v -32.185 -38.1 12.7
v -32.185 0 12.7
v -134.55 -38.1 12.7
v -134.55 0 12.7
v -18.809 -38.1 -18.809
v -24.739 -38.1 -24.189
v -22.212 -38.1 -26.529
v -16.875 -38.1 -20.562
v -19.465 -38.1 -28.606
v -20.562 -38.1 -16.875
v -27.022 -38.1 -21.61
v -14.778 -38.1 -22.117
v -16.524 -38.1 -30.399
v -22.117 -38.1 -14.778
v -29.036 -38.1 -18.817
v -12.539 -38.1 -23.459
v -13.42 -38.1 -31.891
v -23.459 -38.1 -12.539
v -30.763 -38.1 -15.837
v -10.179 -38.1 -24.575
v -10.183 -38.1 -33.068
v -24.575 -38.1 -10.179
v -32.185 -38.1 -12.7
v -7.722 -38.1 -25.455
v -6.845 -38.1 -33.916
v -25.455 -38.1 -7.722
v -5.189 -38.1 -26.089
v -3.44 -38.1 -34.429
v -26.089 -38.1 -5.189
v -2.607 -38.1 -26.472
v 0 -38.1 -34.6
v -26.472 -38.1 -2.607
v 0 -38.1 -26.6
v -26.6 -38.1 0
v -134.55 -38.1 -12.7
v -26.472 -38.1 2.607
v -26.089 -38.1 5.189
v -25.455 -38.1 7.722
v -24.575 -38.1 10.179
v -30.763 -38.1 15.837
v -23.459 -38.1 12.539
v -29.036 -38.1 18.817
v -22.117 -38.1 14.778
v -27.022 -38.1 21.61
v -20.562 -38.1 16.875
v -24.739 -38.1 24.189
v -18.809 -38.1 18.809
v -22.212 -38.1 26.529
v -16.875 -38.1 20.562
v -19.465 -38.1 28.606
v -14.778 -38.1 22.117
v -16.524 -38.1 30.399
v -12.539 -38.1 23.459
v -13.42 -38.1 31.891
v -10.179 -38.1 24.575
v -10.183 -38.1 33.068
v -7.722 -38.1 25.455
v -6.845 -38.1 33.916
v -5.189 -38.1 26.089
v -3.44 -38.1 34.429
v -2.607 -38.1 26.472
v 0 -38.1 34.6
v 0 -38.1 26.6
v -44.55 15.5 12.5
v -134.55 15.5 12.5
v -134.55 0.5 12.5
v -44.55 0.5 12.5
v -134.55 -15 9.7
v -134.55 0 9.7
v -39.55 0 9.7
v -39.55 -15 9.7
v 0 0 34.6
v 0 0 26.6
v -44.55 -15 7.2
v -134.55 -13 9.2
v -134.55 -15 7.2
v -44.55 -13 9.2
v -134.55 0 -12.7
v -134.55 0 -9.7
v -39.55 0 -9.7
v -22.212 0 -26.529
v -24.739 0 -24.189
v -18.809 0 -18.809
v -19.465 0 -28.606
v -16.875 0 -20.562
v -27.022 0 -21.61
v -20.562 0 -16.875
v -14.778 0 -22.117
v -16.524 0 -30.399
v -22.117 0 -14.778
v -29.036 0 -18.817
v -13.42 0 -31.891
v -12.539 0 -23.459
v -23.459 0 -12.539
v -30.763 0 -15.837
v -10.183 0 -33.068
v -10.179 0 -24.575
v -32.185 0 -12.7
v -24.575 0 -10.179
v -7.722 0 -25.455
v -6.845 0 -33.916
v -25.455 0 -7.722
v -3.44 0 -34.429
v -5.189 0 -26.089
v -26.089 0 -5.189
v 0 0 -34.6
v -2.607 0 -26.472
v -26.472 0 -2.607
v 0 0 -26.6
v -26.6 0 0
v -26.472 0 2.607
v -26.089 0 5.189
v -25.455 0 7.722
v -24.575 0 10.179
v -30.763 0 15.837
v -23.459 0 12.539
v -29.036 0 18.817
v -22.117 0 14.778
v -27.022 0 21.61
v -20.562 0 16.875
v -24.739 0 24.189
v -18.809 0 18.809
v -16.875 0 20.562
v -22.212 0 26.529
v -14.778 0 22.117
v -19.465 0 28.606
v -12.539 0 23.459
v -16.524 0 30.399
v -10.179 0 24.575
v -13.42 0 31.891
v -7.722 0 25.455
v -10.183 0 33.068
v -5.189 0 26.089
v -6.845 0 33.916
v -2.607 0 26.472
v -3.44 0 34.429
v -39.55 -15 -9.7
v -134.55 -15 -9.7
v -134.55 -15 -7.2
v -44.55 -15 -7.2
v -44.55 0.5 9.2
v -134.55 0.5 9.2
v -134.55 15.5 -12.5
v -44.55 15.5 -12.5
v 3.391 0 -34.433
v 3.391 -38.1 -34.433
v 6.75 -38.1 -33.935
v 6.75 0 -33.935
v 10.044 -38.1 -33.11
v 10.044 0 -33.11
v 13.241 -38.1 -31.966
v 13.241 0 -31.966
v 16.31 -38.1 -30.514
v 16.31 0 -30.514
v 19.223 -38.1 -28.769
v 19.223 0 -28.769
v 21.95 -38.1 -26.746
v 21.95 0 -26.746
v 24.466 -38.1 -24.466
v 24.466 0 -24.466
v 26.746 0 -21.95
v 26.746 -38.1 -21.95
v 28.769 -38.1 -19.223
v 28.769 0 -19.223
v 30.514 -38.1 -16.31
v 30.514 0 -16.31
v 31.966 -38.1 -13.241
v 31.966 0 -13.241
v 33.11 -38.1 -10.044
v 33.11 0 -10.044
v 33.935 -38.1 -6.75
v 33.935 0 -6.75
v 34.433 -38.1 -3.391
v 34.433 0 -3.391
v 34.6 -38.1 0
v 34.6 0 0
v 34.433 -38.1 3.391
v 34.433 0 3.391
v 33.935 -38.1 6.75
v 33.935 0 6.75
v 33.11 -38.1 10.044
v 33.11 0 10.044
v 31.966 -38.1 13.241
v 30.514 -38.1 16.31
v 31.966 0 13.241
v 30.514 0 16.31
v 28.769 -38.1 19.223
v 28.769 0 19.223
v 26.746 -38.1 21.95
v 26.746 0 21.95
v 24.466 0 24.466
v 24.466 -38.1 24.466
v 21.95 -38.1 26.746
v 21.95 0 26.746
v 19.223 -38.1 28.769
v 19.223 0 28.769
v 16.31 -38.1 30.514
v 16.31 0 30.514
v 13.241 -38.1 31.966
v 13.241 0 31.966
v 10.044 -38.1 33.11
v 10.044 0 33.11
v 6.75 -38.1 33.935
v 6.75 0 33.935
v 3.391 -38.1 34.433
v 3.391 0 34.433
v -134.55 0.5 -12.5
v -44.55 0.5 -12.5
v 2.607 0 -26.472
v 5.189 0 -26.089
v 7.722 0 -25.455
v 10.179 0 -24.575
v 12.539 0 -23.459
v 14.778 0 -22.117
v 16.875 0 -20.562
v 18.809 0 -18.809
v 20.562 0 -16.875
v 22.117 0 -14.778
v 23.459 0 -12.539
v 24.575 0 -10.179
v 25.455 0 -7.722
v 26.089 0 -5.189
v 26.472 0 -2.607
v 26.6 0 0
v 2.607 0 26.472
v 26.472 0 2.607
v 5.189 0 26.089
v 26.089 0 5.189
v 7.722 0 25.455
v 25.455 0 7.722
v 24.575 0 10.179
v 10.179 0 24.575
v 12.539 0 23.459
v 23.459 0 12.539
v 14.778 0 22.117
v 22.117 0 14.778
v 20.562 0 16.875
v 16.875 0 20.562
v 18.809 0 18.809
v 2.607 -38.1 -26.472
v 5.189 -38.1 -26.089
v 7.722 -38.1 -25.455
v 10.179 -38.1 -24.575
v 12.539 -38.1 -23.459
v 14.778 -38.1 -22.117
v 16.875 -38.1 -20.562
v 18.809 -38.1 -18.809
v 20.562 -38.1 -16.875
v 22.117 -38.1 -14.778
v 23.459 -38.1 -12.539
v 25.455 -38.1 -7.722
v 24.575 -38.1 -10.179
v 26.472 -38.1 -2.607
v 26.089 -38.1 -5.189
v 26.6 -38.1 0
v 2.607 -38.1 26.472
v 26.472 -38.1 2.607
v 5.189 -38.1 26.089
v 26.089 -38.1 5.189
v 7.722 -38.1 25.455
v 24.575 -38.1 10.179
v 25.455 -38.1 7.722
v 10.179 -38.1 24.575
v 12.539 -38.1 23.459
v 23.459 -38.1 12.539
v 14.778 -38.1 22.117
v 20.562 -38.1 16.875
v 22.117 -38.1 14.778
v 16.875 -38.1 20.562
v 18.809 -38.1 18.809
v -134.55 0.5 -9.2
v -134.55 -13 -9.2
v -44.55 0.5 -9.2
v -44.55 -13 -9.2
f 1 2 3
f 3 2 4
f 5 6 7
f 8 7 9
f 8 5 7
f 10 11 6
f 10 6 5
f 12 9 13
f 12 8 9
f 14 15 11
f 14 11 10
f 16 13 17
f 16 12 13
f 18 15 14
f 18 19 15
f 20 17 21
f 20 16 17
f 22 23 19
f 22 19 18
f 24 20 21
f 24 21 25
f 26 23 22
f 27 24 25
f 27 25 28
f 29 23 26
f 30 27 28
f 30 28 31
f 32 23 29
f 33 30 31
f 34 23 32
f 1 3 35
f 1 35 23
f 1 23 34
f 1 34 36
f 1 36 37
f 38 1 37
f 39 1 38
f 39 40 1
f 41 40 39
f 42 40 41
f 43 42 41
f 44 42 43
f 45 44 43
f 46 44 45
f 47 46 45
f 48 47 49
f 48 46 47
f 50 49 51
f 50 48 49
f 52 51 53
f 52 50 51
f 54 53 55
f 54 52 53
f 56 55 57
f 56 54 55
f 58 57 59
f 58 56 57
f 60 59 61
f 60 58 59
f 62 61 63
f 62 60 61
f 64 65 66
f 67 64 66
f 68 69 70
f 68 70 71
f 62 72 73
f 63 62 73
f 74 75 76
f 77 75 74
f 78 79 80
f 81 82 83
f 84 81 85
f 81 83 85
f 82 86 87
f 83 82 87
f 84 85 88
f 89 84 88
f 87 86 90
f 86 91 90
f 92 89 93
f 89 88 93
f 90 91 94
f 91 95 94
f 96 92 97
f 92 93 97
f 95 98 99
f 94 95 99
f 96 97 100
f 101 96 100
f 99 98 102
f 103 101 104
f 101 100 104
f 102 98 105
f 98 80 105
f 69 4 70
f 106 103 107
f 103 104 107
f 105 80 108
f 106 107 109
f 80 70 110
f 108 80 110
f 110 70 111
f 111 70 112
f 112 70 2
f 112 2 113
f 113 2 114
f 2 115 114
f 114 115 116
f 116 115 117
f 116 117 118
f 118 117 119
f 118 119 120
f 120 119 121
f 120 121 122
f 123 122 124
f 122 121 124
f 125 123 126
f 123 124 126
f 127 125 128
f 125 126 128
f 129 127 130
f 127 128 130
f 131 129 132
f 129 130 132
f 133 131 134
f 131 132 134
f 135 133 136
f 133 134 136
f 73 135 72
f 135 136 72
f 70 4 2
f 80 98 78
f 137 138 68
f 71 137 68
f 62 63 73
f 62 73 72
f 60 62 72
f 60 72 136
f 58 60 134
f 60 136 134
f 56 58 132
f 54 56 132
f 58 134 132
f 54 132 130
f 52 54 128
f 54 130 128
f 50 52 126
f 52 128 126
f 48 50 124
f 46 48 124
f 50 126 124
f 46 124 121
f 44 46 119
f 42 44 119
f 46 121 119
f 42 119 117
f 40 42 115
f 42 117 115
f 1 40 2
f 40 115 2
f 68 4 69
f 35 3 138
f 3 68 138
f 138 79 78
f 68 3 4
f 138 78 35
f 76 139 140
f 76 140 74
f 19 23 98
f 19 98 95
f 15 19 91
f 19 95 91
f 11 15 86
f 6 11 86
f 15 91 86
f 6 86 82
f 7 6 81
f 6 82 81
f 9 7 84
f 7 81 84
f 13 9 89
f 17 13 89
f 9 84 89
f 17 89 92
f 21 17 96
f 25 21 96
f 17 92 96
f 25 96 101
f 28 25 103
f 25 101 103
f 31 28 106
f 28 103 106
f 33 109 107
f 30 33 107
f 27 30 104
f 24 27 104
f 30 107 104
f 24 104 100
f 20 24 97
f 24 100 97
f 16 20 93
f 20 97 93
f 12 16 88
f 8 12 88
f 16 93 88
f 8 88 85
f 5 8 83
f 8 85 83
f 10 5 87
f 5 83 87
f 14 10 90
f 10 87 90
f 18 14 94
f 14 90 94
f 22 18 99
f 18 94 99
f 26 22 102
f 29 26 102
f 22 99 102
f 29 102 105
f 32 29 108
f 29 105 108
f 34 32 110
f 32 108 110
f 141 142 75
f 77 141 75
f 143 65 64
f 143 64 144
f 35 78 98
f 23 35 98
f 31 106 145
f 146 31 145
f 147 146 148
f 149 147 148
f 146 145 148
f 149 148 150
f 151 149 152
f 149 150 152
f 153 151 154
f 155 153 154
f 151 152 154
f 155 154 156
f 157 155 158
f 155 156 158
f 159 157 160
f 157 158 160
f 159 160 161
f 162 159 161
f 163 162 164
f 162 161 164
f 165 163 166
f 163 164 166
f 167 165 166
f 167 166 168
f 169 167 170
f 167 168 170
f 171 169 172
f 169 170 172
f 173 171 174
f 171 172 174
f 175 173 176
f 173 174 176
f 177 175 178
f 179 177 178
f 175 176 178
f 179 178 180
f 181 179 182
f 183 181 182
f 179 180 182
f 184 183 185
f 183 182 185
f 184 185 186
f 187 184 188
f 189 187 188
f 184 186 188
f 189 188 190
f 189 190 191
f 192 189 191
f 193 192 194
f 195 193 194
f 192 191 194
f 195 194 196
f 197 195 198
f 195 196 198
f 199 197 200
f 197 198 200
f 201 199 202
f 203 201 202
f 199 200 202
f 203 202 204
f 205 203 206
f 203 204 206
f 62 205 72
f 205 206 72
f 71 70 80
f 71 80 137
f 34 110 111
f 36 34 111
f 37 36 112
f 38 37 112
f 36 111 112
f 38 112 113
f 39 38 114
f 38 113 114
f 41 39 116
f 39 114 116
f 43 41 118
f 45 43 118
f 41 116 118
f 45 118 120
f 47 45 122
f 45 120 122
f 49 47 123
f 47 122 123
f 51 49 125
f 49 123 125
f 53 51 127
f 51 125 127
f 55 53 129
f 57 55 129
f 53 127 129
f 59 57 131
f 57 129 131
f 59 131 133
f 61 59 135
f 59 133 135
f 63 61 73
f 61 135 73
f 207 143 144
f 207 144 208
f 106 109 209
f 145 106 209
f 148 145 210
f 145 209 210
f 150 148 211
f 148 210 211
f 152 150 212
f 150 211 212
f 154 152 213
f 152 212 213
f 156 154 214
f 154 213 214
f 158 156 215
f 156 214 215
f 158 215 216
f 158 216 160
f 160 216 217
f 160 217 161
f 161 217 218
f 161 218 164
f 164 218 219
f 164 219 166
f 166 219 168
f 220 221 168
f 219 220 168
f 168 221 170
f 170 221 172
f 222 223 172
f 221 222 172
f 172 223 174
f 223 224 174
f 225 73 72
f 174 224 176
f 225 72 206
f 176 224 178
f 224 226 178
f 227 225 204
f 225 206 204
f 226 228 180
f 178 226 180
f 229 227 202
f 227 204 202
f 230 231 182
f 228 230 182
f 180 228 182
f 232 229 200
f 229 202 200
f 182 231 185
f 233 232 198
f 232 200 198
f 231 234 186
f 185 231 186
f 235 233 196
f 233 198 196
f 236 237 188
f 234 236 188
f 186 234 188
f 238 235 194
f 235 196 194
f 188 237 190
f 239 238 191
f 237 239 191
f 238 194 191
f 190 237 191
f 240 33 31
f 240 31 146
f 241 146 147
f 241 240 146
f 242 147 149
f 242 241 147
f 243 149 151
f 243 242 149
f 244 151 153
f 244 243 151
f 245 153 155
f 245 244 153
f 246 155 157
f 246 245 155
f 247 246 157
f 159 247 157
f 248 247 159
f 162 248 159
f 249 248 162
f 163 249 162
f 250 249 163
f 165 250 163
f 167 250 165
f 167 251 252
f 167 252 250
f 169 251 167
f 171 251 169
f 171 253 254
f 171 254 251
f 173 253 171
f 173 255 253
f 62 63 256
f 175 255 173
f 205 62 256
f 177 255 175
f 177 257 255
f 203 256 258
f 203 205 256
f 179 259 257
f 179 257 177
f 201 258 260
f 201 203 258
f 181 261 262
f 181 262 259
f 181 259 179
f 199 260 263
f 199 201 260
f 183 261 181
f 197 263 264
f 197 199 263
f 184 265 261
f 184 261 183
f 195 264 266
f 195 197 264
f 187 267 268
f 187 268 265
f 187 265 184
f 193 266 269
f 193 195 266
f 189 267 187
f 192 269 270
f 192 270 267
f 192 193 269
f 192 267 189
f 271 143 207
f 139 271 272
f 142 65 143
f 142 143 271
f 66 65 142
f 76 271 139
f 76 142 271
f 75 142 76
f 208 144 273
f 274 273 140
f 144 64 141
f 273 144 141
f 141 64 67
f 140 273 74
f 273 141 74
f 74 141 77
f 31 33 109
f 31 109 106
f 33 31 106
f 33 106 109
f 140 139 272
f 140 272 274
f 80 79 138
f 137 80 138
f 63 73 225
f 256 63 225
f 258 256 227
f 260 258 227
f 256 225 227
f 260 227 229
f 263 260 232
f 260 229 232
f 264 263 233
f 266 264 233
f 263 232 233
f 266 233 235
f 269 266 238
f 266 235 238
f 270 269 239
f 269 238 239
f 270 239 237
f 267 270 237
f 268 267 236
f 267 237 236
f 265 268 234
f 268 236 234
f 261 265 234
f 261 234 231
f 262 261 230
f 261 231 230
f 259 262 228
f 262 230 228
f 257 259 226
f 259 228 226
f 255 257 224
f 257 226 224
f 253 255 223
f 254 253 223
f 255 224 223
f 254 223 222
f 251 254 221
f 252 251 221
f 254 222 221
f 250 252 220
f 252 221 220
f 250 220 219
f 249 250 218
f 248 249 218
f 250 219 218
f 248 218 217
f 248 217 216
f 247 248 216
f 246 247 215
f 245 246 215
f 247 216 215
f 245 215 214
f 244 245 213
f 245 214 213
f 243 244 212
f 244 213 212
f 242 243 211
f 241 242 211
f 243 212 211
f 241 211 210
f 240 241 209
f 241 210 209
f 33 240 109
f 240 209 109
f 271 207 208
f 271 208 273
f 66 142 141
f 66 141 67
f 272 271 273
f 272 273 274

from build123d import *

# Parameters (mm, degrees)
F1_DEPTH = 38.1
F2_W     = 15
F2_H     = 19.4
F3_DEPTH = 95
F5_DEPTH = 38.1
F6_W     = 15
F6_H     = 3.3
F6_H_2   = 18.4
F6_W_2   = 15.5
F7_DEPTH = 90
F8_SIZE  = 2


with BuildPart() as f1:
    # F0 (on Front) → F1 (new body)
    with BuildSketch(Plane.XZ):
        with BuildLine():
            ThreePointArc((-32.1849343638, -12.7), (-34.6, 0), (-32.1849343638, 12.7))
            Line((-32.1849343638, 12.7), (-134.55, 12.7))
            Line((-134.55, 12.7), (-134.55, -12.7))
            Line((-134.55, -12.7), (-32.1849343638, -12.7))
        make_face()
        with BuildLine():
            Line((-26.6, -12.7), (-26.6, 6.93e-08))
            Line((-26.6, 6.93e-08), (-26.6, 12.7))
            Line((-26.6, 12.7), (-32.1849343638, 12.7))
            ThreePointArc((-32.1849343638, 12.7), (-34.6, 0), (-32.1849343638, -12.7))
            Line((-32.1849343638, -12.7), (-26.6, -12.7))
        make_face()
        with BuildLine():
            ThreePointArc((-26.6, 6.93e-08), (-18.8090403551, 18.8090404041), (0, 26.6))
            Line((0, 26.6), (0, 34.6))
            ThreePointArc((0, 34.6), (-19.4645832218, 28.605768649), (-32.1849343638, 12.7))
            Line((-32.1849343638, 12.7), (-26.6, 12.7))
            Line((-26.6, 12.7), (-26.6, 6.93e-08))
        make_face()
        with BuildLine():
            ThreePointArc((0, -26.6), (-18.8090404041, -18.8090403551), (-26.6, 6.93e-08))
            Line((-26.6, 6.93e-08), (-26.6, -12.7))
            Line((-26.6, -12.7), (-32.1849343638, -12.7))
            ThreePointArc((-32.1849343638, -12.7), (-19.4645832218, -28.605768649), (0, -34.6))
            Line((0, -34.6), (0, -26.6))
        make_face()
    extrude(amount=F1_DEPTH)

    # F2 (on face) → F3 (cut)
    with BuildSketch(Plane(origin=(-134.55, 0, 0), x_dir=(0, -1, 0), z_dir=(-1, 0, 0))):
        with Locations((7.5, 0)):
            Rectangle(F2_W, F2_H)
    extrude(amount=-F3_DEPTH, mode=Mode.SUBTRACT)


with BuildPart() as f5:
    # F4 (on Front) → F5 (new body, through all)
    with BuildSketch(Plane.XZ):
        with BuildLine():
            Line((0, -26.6), (0, -34.6))
            ThreePointArc((0, -34.6), (34.6, 0), (0, 34.6))
            Line((0, 34.6), (0, 26.6))
            ThreePointArc((0, 26.6), (26.6, 0), (0, -26.6))
        make_face()
    extrude(amount=F5_DEPTH)


with BuildPart() as f7:
    # F6 (on face) → F7 (new body)
    with BuildSketch(Plane(origin=(-134.55, 0, 0), x_dir=(0, -1, 0), z_dir=(-1, 0, 0))):
        with Locations((-8, -10.85)):
            Rectangle(F6_W, F6_H)
        with Locations((-8, 0)):
            Rectangle(F6_W, F6_H_2)
        with Locations((-8, 10.85)):
            Rectangle(F6_W, F6_H)
        with Locations((7.25, 0)):
            Rectangle(F6_W_2, F6_H_2)
    extrude(amount=-F7_DEPTH)

    # F8
    f8_edges = [f7.edges().sort_by_distance(p)[0] for p in [
        (-89.55, -15, -9.2),
        (-89.55, -15, 9.2),
    ]]
    chamfer(f8_edges, length=F8_SIZE)


solid = Compound([f1.part, f5.part, f7.part])
